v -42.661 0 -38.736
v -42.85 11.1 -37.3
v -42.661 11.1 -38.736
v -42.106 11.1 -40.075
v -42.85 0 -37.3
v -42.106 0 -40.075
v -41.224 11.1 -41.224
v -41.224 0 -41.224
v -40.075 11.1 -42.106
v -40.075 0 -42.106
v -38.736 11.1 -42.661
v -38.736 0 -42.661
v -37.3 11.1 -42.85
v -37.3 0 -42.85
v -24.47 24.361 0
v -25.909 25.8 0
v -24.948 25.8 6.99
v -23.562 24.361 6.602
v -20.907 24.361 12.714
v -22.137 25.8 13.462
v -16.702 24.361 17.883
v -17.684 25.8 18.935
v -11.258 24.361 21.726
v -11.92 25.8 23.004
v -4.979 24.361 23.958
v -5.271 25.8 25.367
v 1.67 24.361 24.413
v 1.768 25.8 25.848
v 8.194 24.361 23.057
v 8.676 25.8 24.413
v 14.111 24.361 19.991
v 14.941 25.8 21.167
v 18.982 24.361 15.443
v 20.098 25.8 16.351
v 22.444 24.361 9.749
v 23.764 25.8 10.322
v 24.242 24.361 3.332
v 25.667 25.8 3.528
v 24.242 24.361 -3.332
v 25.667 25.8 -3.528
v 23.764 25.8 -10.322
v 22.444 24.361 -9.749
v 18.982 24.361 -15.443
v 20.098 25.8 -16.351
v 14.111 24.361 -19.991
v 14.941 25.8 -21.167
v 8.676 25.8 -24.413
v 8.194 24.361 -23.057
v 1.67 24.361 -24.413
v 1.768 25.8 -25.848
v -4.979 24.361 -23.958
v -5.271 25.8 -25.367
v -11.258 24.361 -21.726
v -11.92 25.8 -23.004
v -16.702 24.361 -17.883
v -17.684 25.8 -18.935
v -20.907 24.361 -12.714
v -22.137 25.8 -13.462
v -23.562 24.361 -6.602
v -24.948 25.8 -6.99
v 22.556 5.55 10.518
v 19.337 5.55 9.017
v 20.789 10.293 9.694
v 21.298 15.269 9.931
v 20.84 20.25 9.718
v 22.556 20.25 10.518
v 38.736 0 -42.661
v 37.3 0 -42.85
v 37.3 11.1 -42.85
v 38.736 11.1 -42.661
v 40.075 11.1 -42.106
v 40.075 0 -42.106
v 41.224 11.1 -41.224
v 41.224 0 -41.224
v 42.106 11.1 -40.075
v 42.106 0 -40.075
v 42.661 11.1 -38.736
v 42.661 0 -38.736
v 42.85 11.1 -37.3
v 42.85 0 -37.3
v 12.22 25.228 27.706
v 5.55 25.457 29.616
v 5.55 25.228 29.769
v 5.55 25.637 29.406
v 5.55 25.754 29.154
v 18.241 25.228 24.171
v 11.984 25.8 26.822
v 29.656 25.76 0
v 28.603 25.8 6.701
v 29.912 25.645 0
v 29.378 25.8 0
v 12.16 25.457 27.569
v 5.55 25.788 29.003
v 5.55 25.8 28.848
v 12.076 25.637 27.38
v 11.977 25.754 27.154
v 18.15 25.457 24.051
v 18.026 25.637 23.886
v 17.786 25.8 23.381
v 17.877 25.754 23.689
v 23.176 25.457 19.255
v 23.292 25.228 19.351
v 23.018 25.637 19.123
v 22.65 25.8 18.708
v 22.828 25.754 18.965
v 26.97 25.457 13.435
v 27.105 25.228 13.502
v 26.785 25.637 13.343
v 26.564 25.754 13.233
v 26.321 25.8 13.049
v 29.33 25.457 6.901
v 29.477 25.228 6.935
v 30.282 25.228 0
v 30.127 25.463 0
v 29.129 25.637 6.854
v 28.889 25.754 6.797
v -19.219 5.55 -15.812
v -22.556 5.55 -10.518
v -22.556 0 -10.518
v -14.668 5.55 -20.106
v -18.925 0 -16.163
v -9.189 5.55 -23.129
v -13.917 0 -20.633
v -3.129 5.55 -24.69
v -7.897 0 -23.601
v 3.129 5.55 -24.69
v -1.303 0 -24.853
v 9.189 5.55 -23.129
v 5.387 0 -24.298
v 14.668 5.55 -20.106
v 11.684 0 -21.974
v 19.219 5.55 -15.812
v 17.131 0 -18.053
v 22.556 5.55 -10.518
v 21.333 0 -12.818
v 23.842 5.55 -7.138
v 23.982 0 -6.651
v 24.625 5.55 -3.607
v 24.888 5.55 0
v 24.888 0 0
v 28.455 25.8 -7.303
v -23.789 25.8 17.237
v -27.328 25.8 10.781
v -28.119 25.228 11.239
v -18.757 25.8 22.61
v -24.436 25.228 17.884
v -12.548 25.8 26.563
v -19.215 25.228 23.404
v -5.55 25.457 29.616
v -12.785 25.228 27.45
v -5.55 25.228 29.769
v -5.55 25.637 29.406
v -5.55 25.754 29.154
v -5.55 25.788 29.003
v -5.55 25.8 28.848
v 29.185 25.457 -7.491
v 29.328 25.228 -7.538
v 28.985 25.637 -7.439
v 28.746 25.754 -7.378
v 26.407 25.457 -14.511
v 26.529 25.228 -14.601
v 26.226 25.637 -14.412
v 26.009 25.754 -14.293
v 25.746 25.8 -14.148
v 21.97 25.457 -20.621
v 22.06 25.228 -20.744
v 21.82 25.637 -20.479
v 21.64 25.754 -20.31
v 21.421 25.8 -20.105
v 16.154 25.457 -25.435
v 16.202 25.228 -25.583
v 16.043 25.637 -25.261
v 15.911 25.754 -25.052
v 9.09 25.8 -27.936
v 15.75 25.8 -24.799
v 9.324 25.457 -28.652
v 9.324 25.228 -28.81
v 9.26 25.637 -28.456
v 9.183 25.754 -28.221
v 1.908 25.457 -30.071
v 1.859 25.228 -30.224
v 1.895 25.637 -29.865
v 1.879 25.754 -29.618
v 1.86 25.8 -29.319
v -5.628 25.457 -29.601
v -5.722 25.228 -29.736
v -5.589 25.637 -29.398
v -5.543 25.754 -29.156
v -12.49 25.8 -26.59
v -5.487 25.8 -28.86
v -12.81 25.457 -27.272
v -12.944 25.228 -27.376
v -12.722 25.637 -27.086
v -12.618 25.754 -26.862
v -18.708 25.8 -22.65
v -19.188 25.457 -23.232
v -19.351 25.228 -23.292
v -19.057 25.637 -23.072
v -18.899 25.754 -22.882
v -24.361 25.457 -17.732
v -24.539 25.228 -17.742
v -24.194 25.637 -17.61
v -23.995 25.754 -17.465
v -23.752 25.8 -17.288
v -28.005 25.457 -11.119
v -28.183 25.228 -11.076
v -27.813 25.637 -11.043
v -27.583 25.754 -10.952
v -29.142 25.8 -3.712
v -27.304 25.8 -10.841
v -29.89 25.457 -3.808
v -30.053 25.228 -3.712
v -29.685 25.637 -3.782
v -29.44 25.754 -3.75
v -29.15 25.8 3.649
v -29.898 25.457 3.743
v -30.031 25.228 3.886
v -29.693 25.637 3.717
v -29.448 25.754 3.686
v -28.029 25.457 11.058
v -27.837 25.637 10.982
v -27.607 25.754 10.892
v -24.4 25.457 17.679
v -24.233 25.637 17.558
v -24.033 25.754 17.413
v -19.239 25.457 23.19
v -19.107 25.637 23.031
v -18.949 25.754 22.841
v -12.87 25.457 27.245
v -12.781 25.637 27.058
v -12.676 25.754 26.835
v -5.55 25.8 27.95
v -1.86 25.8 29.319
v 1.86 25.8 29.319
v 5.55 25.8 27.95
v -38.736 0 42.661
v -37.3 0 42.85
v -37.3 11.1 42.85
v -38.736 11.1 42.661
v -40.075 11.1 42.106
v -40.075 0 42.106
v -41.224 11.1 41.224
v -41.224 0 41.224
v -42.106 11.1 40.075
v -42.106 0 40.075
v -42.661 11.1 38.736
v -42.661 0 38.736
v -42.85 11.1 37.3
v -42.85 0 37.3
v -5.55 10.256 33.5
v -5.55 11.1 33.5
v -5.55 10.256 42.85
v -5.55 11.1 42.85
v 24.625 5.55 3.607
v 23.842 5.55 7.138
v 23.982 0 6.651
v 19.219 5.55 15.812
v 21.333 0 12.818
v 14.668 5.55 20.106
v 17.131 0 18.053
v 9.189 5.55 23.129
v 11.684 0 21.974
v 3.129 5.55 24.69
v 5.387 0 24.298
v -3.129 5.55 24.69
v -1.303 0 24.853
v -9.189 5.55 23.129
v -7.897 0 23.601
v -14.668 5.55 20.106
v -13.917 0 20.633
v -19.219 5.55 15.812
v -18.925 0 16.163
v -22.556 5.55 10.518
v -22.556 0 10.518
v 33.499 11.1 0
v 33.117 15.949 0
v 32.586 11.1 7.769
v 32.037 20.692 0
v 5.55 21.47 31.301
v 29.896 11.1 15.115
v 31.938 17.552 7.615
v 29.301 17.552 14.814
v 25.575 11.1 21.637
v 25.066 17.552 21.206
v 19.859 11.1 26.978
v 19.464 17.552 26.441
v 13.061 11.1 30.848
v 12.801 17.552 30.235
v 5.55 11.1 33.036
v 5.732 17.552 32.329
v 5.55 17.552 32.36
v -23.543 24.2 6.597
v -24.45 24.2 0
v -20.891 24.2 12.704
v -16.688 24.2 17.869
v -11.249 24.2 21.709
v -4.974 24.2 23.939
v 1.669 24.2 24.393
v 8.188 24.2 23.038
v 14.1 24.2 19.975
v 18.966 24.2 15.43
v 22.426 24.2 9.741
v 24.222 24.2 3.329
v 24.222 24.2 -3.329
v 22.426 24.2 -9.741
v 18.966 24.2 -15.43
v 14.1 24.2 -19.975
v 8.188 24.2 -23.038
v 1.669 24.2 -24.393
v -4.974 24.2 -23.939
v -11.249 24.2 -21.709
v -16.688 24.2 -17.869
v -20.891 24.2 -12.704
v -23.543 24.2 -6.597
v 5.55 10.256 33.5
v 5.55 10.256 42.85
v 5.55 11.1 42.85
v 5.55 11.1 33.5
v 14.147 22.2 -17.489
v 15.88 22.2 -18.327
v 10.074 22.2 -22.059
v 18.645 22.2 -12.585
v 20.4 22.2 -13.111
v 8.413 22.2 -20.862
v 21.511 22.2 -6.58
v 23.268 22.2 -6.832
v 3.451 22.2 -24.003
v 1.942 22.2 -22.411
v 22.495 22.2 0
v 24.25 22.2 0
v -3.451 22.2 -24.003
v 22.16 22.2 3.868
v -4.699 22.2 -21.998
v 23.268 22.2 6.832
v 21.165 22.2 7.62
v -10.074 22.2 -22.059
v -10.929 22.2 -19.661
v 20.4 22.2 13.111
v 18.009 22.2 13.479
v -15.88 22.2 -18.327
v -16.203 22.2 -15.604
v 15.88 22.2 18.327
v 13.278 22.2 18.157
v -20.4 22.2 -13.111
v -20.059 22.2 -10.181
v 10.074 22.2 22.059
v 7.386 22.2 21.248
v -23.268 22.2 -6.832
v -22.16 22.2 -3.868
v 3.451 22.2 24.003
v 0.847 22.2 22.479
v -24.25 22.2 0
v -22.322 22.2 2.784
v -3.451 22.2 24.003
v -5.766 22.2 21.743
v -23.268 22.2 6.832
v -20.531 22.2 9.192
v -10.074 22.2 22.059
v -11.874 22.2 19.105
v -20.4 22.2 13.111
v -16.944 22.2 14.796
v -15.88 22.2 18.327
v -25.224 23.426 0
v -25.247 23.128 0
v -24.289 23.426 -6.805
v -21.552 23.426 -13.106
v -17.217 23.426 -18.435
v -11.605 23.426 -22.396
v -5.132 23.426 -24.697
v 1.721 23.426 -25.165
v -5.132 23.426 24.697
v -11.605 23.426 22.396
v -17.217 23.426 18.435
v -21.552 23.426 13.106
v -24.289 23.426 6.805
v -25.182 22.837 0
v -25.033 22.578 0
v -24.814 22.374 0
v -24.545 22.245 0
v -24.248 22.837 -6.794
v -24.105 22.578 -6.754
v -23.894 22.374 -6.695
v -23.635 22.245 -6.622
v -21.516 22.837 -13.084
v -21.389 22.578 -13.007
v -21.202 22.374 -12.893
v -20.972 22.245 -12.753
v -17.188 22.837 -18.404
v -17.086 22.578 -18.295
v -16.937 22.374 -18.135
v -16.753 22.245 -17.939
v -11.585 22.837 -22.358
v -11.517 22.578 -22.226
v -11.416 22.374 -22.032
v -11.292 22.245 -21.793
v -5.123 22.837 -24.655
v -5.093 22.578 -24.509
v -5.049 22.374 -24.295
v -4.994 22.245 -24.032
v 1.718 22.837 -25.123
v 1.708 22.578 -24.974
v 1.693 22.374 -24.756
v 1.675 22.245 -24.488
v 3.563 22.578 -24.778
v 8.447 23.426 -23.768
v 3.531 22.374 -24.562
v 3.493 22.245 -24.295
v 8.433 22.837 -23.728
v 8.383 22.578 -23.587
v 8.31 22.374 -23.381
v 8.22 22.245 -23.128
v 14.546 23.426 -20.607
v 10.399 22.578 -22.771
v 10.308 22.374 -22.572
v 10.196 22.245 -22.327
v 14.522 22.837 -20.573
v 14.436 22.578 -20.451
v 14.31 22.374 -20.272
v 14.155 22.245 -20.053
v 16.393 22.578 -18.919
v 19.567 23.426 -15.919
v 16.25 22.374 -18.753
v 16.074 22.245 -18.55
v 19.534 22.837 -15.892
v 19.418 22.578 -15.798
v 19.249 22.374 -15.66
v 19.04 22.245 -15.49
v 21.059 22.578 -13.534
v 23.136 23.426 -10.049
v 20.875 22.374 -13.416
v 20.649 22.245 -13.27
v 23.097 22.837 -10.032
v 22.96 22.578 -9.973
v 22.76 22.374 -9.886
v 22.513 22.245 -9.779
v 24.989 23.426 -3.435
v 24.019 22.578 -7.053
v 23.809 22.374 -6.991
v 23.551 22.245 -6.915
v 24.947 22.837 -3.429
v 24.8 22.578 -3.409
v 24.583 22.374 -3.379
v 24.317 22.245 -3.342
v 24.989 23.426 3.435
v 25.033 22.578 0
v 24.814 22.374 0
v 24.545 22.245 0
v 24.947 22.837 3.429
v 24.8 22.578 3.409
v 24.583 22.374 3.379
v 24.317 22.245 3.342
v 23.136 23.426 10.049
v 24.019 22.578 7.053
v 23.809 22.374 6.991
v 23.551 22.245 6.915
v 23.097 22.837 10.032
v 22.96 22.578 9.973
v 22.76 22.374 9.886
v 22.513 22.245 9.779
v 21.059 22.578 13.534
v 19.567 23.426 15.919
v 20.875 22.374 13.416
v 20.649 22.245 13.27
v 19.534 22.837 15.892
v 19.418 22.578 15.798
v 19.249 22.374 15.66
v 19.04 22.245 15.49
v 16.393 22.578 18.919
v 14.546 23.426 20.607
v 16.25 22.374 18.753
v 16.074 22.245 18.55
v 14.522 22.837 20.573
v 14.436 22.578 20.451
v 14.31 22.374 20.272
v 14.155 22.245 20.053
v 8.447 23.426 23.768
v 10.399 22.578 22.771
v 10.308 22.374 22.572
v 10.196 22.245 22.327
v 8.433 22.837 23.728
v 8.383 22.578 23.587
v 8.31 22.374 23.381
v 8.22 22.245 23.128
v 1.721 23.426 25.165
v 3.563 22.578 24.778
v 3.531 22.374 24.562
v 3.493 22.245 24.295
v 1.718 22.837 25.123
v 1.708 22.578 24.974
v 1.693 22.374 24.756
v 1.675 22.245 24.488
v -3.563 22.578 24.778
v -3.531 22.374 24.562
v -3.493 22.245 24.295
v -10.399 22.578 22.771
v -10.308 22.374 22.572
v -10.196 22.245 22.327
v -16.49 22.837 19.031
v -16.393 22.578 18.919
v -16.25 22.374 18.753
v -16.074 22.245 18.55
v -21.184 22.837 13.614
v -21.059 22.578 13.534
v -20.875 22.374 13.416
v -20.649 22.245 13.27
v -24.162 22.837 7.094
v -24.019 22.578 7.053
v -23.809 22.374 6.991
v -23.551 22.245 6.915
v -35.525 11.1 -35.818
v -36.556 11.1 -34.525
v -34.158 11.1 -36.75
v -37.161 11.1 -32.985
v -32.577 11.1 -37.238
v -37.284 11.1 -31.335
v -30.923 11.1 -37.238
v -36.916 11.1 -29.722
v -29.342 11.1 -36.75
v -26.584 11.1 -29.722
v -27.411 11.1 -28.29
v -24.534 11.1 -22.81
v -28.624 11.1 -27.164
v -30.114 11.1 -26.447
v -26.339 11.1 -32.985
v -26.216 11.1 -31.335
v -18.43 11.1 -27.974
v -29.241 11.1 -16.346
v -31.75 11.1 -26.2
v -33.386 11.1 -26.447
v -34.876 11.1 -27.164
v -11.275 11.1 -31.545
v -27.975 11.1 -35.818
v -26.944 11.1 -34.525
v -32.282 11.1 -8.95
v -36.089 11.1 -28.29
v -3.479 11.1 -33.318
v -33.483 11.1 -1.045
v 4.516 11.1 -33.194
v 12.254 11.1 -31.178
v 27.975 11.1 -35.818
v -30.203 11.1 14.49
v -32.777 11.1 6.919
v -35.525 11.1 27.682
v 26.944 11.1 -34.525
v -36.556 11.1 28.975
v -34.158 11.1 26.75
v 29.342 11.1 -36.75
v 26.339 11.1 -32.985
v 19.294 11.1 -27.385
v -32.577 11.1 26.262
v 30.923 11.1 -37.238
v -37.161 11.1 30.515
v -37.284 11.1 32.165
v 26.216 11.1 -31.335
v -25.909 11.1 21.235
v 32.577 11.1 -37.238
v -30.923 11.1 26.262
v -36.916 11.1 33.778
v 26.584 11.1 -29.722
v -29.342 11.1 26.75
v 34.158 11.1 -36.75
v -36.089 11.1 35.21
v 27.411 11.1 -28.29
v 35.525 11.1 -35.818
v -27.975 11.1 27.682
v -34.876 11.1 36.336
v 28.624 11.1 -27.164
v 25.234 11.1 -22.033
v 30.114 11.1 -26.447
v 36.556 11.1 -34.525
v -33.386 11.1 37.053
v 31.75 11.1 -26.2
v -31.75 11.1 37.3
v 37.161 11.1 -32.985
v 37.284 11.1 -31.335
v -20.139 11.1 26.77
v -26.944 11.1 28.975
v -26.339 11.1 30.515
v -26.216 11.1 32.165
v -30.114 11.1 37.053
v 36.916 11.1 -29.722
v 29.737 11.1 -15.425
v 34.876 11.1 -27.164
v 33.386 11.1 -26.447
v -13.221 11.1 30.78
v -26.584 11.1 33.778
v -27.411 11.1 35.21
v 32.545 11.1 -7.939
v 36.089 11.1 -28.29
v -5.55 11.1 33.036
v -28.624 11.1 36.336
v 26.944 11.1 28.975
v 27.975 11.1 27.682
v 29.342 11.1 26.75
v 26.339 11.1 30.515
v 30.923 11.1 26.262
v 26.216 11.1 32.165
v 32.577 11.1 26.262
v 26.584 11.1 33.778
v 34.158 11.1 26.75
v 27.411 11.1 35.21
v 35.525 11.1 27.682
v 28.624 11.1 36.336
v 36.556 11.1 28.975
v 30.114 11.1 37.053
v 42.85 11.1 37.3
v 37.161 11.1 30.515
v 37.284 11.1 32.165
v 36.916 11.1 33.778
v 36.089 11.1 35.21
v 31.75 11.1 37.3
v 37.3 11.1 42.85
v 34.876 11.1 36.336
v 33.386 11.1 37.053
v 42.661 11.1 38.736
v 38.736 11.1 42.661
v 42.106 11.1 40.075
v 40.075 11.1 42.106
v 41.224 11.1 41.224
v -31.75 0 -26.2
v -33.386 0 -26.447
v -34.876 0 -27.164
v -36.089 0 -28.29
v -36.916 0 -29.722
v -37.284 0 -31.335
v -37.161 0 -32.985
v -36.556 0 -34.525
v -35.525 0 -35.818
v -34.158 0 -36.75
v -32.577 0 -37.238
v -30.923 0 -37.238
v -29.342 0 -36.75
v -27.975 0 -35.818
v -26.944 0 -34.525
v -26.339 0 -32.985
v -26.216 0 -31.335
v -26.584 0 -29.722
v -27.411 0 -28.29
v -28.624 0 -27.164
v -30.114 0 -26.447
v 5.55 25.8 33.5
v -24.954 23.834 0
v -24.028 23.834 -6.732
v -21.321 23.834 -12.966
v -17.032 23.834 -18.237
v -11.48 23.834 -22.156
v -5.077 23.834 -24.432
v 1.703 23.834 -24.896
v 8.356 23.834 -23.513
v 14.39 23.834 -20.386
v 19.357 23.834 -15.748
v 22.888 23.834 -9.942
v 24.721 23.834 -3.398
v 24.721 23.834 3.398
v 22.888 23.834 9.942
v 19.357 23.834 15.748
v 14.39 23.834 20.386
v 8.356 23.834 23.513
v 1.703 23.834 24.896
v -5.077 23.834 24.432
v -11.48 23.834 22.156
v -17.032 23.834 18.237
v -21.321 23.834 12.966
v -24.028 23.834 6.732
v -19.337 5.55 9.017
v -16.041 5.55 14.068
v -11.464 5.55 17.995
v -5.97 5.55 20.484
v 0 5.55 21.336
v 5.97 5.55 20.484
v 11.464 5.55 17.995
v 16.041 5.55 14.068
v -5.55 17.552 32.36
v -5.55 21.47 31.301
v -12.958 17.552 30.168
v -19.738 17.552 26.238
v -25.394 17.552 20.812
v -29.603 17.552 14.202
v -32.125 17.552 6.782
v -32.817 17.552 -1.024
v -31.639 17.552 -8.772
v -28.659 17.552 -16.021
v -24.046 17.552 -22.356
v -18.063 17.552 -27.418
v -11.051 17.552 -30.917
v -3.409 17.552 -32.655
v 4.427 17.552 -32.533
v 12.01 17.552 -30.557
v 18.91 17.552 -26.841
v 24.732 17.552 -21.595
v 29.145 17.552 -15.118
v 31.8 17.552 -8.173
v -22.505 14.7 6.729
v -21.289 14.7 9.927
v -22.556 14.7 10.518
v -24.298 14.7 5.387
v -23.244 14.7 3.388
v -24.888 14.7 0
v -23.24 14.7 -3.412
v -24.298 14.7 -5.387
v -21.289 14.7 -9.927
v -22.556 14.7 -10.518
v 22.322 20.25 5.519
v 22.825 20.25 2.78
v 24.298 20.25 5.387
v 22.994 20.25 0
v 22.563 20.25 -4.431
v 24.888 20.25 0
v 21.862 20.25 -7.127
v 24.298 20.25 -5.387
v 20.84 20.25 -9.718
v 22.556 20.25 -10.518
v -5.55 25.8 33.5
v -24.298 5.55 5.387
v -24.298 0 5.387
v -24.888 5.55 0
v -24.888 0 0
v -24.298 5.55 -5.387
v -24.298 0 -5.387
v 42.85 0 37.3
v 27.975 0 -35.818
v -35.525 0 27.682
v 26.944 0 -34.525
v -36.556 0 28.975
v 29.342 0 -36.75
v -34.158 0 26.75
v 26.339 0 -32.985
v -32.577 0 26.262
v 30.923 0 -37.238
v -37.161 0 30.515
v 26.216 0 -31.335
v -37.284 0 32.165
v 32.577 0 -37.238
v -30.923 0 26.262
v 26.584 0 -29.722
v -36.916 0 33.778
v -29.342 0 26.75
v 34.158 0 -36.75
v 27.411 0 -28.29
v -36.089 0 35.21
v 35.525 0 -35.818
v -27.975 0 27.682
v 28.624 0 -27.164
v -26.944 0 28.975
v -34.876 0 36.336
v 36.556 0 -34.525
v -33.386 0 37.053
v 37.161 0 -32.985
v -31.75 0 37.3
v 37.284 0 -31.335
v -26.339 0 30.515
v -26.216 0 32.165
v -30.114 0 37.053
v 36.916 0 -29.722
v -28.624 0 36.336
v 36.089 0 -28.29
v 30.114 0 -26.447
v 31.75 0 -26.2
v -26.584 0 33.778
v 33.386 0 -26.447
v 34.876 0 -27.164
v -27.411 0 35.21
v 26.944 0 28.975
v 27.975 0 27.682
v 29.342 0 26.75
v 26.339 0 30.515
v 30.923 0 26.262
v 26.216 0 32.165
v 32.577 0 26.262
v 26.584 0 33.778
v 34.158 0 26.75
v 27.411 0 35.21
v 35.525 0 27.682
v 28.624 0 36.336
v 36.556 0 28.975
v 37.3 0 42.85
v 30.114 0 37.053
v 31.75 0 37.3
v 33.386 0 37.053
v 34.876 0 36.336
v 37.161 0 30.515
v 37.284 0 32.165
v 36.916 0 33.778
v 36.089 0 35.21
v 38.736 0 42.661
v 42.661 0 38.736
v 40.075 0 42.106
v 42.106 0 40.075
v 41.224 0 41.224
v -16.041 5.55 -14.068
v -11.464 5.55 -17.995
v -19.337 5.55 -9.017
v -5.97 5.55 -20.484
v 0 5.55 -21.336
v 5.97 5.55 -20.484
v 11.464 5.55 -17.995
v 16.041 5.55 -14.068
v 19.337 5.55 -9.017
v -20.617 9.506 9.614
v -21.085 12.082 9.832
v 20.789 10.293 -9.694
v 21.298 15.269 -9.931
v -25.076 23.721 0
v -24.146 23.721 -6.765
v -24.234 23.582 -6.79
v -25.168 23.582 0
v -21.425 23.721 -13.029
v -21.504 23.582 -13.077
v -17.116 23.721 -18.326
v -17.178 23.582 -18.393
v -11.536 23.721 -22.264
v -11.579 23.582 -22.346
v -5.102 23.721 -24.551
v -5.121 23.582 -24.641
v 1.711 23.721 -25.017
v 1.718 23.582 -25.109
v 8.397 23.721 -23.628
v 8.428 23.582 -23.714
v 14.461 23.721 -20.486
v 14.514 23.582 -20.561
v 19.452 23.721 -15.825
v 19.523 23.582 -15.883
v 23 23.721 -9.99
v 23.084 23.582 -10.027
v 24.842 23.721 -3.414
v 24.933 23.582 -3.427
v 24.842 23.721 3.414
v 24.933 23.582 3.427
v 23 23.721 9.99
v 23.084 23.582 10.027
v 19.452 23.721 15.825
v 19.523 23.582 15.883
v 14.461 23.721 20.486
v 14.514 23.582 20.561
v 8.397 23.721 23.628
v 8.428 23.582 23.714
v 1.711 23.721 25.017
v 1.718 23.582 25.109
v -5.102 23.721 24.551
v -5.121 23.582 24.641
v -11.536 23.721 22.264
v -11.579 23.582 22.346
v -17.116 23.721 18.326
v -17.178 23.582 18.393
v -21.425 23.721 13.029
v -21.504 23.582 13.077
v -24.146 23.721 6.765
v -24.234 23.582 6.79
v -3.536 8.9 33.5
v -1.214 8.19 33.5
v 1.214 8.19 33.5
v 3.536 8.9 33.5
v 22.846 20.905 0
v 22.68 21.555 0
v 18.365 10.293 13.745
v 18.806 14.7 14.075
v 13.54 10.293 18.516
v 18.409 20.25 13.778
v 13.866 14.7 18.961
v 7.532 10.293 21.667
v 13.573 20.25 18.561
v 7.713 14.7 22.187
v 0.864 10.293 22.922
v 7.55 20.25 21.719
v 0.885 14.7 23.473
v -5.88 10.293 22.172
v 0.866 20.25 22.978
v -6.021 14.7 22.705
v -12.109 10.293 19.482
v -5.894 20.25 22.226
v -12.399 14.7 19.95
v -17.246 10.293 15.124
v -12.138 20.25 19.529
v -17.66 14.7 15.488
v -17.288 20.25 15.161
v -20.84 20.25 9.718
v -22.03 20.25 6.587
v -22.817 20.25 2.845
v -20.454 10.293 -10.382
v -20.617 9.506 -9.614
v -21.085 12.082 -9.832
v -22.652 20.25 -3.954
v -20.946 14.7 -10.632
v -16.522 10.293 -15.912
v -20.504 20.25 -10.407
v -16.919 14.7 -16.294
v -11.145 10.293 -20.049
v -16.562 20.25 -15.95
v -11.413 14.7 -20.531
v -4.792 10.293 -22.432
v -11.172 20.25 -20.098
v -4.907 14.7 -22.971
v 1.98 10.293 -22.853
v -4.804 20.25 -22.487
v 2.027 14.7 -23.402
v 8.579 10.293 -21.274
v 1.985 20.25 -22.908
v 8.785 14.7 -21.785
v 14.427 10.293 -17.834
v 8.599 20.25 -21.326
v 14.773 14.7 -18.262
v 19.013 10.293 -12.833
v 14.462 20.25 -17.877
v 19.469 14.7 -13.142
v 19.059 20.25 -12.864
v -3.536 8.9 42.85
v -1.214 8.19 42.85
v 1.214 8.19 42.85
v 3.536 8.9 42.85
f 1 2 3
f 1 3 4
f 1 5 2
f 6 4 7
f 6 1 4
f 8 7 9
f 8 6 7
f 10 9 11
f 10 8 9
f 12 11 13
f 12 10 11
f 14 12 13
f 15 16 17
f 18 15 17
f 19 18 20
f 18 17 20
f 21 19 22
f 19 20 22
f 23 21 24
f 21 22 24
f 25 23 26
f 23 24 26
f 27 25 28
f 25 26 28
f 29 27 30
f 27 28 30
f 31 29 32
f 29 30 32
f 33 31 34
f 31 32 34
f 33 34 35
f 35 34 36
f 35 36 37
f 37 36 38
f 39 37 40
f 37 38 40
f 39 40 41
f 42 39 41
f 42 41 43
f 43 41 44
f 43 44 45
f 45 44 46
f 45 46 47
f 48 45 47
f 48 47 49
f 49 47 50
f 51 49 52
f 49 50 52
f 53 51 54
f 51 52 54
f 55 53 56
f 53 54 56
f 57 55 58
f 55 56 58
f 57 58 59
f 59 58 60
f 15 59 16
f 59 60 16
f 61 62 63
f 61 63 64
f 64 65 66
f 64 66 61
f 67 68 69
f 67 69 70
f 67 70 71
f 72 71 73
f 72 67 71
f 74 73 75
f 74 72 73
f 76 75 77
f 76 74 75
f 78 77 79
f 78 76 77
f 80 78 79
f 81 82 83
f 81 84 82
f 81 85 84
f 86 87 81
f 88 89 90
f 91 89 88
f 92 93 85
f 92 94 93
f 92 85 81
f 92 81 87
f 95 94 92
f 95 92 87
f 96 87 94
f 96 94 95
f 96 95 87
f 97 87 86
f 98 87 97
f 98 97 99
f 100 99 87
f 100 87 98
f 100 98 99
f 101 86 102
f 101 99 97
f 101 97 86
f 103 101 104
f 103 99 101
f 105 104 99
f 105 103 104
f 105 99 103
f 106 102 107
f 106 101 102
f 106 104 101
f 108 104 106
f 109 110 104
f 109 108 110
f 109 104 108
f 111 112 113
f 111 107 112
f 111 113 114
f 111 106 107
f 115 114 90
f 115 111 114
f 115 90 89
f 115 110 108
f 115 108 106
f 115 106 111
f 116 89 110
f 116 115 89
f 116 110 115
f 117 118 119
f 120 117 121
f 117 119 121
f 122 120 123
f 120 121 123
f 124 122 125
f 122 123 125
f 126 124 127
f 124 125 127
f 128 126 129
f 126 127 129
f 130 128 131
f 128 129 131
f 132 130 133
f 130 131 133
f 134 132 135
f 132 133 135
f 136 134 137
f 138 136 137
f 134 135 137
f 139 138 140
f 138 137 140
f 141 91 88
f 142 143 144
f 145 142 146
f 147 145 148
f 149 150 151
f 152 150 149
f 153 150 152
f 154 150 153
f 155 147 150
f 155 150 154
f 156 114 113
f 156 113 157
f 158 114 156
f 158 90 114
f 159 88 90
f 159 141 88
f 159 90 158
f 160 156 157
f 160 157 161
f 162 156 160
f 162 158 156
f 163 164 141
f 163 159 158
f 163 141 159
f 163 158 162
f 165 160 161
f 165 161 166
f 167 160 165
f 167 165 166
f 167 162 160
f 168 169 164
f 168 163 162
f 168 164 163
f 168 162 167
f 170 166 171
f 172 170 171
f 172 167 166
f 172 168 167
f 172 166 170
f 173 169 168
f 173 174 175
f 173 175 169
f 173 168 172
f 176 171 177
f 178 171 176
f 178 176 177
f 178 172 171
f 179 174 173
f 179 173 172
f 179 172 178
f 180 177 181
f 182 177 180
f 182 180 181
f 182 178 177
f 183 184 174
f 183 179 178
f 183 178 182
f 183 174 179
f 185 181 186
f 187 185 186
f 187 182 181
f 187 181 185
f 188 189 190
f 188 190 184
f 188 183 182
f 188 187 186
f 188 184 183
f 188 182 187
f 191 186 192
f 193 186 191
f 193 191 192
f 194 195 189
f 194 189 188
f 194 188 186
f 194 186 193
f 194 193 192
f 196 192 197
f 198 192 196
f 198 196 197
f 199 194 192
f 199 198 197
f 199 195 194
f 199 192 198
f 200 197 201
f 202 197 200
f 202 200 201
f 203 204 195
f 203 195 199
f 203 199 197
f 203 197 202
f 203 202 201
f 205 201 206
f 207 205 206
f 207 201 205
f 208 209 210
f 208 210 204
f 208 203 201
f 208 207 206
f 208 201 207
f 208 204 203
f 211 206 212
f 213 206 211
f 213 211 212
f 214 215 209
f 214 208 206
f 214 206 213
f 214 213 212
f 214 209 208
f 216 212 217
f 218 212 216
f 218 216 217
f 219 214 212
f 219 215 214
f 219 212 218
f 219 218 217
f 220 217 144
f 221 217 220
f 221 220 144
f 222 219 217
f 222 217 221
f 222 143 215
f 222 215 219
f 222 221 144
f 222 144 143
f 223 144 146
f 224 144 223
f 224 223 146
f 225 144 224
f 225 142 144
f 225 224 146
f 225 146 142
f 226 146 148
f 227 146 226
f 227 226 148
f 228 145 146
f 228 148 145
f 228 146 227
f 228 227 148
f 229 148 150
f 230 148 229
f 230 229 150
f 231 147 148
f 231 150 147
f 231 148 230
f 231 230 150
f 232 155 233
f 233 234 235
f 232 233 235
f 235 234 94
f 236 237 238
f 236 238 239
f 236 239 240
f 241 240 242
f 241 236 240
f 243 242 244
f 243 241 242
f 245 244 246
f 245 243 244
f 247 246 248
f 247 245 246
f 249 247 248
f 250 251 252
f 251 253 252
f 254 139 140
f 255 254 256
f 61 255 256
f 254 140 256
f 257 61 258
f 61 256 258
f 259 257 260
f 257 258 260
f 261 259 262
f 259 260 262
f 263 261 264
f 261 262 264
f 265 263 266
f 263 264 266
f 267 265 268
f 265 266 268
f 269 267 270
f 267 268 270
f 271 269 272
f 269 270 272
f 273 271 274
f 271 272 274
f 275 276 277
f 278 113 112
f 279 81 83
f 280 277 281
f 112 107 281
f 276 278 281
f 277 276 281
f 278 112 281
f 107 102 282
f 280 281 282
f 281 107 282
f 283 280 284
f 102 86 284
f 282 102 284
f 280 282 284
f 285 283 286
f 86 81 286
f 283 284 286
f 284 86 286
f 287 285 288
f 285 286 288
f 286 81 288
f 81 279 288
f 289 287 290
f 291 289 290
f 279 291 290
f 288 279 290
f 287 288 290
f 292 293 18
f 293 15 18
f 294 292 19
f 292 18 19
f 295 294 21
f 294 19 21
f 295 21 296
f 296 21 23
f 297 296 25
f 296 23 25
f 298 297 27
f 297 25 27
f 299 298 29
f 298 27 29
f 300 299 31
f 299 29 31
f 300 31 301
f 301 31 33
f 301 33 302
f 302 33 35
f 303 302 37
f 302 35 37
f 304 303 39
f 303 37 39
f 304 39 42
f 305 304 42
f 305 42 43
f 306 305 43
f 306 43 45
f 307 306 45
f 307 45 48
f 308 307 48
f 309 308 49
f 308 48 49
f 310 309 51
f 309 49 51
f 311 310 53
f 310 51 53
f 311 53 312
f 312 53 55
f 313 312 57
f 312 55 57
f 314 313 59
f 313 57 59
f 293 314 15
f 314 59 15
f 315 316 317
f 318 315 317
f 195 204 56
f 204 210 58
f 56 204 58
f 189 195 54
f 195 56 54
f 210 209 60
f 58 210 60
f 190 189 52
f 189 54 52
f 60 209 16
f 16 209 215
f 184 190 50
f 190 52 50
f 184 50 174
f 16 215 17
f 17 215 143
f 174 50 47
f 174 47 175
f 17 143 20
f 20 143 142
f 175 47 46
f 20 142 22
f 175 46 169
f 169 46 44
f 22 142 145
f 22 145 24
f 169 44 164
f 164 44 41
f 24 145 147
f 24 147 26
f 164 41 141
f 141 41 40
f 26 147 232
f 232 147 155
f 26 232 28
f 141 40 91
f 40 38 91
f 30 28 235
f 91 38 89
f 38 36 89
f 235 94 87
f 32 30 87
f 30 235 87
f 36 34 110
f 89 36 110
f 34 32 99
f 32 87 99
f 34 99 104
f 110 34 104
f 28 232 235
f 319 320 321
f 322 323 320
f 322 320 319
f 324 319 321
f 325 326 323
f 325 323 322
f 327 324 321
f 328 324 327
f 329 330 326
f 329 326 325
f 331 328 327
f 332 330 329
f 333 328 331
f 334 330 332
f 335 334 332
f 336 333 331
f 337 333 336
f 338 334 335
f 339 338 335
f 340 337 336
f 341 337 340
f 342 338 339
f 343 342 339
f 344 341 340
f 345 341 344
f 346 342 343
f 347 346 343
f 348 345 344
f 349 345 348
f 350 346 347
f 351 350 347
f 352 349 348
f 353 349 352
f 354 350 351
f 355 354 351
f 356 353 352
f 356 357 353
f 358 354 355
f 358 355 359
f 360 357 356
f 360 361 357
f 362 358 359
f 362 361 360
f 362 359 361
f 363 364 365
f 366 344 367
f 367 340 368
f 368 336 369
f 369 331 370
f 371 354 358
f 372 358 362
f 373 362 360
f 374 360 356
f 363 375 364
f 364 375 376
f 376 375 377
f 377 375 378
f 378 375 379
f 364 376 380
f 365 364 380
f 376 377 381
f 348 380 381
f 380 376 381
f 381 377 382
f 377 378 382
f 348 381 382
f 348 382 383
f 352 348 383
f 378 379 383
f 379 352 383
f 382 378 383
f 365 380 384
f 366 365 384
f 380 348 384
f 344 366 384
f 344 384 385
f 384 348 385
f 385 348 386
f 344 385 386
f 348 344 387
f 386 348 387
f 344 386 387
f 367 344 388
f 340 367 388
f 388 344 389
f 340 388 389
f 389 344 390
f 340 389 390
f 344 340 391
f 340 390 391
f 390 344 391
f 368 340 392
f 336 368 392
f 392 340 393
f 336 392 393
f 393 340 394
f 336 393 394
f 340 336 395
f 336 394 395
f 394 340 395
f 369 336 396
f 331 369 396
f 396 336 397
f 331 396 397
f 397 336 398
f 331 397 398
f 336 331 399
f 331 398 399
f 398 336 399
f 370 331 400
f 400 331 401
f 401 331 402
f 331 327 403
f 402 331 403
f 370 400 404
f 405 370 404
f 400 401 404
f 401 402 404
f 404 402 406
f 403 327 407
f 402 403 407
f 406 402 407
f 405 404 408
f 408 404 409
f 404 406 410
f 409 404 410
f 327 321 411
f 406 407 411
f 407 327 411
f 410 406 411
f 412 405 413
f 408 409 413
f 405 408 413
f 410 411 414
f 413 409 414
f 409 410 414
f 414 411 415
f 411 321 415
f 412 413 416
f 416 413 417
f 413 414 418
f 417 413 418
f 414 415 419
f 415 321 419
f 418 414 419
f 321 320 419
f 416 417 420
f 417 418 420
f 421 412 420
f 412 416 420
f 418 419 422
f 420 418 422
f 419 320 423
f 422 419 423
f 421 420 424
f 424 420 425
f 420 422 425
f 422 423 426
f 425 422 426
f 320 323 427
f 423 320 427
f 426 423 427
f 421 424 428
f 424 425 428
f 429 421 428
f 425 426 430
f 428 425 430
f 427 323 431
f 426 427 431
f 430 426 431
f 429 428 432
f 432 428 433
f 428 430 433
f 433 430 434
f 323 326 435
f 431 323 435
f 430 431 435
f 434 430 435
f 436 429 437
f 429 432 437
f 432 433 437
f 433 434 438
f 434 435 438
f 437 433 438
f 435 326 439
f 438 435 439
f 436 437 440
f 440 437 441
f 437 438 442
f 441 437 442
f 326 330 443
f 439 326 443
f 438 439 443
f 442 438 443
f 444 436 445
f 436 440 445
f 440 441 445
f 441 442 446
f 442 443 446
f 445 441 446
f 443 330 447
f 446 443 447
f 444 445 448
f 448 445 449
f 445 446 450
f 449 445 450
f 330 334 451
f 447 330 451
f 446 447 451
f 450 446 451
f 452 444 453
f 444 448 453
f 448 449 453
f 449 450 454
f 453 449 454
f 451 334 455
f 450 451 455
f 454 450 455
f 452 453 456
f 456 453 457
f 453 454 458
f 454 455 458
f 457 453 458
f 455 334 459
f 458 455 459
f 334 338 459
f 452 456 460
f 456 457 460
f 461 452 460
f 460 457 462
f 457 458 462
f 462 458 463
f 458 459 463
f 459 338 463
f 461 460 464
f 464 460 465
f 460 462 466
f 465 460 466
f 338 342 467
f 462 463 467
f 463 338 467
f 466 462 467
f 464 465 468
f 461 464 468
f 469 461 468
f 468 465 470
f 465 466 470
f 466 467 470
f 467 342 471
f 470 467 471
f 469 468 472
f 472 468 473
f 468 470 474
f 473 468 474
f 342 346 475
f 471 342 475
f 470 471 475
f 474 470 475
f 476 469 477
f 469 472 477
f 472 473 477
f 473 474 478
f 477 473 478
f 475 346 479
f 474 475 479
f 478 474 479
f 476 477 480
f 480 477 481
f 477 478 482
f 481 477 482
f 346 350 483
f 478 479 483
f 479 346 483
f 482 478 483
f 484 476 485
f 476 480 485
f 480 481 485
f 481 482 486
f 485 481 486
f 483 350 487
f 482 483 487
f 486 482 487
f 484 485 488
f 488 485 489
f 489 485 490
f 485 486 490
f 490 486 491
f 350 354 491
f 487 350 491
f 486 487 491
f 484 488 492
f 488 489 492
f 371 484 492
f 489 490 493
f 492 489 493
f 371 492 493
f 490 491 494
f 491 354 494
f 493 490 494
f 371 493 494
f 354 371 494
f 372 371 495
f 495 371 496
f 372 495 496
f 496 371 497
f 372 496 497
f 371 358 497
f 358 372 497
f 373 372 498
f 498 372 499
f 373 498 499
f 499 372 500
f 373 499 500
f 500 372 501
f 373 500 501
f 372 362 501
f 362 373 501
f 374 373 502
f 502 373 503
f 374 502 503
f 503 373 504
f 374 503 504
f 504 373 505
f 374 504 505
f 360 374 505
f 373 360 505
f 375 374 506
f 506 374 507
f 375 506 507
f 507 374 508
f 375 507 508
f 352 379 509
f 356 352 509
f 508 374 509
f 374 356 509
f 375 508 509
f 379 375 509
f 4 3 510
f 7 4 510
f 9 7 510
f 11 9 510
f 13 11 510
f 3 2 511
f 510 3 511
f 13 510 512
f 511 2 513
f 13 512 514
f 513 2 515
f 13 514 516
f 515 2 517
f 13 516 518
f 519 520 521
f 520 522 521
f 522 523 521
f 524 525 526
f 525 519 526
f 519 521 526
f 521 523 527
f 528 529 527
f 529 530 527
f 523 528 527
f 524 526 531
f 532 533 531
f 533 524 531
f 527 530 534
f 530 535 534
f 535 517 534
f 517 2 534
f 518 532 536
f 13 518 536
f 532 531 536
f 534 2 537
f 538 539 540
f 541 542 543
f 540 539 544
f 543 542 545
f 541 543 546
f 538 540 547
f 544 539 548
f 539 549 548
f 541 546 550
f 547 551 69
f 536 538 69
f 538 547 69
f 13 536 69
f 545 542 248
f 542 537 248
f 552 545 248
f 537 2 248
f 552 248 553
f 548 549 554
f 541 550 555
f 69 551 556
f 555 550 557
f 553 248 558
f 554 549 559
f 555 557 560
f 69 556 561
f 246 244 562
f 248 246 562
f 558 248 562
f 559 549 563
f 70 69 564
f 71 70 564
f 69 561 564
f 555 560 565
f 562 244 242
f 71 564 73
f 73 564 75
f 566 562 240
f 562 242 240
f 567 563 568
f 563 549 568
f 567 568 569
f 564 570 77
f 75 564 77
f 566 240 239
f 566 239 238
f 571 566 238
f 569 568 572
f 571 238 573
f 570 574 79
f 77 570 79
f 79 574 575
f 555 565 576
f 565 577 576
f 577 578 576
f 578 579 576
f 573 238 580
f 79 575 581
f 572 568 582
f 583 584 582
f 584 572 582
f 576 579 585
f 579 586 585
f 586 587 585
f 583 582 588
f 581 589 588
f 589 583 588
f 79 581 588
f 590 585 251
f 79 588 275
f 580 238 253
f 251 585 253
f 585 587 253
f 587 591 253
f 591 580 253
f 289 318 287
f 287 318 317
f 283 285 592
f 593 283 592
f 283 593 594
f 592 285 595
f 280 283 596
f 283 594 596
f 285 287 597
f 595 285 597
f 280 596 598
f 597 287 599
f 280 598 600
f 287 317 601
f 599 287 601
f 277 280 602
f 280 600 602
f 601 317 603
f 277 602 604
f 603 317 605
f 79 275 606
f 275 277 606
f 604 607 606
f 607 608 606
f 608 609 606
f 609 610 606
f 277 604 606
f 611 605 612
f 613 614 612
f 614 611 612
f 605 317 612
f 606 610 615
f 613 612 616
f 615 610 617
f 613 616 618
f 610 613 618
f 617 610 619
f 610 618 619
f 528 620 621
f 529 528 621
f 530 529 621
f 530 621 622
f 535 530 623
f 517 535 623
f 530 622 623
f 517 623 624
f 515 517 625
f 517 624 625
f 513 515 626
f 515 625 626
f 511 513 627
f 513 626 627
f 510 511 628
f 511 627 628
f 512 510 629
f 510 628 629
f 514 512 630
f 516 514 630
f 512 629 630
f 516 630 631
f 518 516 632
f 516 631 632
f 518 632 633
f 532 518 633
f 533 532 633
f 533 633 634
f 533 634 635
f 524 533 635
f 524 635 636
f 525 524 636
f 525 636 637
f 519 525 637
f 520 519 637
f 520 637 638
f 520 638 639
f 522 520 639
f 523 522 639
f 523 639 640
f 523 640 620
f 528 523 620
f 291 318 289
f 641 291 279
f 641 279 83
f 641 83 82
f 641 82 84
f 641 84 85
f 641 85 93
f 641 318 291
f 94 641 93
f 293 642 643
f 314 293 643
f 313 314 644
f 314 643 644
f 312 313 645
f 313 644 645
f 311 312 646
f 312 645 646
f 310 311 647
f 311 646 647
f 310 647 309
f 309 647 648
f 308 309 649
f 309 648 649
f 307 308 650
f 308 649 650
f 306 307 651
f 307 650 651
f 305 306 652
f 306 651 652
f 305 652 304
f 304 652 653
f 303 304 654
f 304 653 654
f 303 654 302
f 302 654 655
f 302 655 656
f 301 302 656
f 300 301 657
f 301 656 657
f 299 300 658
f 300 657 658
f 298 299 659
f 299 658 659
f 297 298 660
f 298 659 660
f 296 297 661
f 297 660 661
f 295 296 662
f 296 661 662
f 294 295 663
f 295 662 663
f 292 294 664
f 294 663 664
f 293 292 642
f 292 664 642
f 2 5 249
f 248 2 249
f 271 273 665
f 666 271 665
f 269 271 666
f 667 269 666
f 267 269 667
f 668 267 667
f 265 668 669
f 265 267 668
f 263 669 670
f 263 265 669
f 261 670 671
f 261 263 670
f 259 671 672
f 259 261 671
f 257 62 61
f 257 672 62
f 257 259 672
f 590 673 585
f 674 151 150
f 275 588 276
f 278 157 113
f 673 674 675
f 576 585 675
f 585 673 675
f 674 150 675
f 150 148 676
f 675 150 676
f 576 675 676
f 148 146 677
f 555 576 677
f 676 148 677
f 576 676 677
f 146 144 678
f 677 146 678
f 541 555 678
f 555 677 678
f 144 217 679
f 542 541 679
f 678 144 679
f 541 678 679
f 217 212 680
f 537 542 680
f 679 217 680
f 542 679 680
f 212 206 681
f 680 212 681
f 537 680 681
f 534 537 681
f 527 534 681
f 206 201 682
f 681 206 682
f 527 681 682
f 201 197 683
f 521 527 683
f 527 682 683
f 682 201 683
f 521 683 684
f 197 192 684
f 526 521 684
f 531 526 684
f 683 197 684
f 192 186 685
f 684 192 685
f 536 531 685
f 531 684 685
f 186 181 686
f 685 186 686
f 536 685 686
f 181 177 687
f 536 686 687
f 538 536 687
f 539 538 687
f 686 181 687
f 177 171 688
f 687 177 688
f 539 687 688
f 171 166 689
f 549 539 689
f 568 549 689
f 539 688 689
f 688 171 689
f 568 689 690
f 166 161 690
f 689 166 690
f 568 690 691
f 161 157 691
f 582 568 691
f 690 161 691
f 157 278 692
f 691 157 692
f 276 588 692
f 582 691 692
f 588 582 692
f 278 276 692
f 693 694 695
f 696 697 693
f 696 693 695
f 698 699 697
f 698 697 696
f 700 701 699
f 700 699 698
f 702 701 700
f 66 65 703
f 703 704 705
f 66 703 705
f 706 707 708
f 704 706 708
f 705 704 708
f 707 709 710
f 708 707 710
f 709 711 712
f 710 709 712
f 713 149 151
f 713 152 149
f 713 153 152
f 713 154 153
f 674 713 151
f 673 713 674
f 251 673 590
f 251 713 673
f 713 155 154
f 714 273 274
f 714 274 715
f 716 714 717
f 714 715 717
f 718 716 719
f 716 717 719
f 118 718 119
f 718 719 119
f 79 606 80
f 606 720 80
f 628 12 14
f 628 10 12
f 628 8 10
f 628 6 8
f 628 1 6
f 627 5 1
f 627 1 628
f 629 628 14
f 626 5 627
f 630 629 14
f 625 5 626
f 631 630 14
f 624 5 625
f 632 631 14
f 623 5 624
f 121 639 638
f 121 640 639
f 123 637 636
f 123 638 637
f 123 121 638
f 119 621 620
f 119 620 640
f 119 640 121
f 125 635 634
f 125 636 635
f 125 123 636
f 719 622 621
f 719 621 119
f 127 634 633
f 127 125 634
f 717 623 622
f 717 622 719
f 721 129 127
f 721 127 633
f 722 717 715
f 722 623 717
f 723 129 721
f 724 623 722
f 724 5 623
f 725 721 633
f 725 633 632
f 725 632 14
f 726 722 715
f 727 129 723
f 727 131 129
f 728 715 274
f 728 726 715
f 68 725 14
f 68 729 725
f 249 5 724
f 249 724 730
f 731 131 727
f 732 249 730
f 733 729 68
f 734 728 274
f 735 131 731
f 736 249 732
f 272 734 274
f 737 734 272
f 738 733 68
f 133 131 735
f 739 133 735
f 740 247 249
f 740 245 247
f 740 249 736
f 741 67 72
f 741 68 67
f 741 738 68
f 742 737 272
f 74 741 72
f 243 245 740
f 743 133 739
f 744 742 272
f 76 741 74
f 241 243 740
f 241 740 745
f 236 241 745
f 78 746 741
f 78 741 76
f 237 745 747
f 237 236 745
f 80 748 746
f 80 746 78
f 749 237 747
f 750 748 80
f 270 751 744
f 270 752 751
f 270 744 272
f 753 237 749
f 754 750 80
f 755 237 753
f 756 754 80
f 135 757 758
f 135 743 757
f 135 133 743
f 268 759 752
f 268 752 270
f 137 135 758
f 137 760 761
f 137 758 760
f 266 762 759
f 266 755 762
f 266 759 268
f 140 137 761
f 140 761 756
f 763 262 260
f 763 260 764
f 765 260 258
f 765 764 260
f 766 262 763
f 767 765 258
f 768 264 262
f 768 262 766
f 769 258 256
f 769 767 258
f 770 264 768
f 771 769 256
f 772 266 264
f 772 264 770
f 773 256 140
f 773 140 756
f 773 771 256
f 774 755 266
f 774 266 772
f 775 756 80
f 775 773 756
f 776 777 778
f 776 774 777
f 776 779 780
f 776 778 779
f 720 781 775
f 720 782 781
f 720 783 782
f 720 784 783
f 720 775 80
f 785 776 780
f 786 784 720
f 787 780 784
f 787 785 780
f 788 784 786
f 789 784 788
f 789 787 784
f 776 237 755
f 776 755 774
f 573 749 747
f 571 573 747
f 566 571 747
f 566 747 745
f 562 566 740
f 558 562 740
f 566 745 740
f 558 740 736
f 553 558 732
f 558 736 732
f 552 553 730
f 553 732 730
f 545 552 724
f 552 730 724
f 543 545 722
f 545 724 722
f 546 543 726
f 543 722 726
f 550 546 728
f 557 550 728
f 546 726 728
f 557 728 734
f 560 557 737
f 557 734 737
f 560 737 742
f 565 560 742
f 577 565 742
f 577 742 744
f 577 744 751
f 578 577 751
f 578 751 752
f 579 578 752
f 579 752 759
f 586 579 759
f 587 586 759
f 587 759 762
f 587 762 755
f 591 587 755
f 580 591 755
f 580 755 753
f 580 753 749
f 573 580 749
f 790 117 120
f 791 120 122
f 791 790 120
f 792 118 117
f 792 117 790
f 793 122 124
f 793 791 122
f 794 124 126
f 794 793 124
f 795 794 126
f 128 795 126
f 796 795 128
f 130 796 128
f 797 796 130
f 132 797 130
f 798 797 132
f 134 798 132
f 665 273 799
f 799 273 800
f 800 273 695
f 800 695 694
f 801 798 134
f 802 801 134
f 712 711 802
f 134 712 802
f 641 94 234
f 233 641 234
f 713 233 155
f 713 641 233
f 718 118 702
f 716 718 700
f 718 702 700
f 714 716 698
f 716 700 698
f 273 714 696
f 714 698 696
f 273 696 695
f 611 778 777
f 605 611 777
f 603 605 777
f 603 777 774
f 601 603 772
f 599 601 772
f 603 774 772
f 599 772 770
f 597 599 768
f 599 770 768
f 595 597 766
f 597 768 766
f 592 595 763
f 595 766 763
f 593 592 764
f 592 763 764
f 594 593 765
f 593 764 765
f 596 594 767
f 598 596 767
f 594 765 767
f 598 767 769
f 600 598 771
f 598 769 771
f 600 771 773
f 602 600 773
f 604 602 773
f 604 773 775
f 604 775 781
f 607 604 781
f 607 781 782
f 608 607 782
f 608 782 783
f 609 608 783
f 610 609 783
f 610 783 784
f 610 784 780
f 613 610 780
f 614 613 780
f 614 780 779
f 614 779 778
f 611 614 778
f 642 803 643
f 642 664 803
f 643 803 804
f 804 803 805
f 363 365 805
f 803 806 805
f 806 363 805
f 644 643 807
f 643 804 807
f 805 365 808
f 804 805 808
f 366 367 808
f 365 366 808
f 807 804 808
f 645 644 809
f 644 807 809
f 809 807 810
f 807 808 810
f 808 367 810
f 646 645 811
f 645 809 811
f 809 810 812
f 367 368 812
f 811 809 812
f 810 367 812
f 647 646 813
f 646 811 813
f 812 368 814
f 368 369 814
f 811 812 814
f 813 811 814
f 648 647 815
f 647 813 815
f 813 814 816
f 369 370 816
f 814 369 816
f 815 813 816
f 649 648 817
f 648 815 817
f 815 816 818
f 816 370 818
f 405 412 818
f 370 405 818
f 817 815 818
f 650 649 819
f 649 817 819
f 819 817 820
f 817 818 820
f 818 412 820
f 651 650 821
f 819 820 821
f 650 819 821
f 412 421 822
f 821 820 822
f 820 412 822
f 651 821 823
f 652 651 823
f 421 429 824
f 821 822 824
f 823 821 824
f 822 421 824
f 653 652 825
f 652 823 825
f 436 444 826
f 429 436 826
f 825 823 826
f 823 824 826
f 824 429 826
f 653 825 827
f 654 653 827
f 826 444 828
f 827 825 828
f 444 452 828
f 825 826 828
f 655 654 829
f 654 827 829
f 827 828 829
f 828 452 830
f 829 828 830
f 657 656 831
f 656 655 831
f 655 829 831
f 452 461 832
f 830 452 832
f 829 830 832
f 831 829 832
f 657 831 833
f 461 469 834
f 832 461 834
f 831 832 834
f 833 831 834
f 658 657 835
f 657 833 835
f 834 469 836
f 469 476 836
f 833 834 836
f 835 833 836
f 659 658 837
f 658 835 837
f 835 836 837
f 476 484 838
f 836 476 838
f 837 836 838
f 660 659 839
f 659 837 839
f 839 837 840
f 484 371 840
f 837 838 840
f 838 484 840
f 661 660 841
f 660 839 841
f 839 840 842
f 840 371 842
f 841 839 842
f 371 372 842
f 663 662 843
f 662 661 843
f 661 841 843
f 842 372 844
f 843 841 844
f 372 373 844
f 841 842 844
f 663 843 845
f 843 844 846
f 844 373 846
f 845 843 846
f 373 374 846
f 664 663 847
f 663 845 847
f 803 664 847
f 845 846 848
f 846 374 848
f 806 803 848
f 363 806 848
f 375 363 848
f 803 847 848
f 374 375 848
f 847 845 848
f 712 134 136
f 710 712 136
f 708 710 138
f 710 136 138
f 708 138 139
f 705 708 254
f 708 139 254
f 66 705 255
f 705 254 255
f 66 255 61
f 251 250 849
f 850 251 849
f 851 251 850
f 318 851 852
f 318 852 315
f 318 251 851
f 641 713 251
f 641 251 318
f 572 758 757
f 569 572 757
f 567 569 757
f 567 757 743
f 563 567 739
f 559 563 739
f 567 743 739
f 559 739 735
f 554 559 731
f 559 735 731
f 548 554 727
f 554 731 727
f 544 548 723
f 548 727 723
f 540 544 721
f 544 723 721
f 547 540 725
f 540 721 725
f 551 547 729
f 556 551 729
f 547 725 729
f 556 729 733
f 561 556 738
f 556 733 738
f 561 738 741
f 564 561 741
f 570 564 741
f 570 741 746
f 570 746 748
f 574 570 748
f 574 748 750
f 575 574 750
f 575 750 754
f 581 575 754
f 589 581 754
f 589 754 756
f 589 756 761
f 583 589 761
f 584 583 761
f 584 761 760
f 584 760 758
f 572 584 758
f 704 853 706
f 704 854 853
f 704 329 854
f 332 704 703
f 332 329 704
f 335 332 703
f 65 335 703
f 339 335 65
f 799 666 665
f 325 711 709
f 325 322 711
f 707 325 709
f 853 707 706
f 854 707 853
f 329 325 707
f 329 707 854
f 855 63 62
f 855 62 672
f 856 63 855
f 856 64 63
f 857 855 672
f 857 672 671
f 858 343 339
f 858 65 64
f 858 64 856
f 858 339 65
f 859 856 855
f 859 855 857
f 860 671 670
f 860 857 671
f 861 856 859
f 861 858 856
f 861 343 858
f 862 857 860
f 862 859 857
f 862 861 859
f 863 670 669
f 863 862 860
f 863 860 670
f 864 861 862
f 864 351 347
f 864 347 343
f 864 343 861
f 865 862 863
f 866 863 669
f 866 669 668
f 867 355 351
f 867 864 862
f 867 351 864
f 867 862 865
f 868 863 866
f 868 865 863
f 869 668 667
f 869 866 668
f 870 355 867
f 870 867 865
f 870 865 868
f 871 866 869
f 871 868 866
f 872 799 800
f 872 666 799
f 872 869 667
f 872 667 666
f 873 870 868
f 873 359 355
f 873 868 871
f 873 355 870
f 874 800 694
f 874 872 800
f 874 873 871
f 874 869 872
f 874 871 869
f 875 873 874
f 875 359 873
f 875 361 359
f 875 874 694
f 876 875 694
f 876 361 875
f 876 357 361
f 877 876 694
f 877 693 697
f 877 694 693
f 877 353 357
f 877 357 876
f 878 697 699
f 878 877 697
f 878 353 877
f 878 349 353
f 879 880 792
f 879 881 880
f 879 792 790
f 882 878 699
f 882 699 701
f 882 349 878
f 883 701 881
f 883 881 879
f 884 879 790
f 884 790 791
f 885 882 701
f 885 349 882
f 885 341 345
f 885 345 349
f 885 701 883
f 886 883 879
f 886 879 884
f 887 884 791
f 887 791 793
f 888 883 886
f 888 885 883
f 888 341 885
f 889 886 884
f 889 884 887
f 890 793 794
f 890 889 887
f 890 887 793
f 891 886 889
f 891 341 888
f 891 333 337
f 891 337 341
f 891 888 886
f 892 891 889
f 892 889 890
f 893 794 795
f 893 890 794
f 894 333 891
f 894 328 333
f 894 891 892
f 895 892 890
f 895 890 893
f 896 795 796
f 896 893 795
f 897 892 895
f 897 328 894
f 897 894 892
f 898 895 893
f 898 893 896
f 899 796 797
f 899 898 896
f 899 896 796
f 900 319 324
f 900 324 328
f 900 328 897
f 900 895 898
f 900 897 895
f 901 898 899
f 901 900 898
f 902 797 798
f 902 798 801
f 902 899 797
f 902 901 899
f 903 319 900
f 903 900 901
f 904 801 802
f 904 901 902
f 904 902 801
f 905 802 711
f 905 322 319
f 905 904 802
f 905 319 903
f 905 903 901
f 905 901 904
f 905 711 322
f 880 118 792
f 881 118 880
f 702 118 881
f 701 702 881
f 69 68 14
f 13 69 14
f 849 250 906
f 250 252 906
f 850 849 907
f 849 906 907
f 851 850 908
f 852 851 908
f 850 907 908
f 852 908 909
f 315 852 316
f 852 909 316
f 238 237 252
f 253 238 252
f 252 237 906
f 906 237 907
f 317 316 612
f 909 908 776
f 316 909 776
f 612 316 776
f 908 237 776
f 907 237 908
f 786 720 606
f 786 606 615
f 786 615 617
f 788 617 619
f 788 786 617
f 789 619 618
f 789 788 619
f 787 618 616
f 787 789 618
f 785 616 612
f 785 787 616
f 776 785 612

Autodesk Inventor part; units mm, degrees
sketch "Sketch_1" plane through (0, 0, 0) normal (0, 0, 1) x (1, 0, 0)
  line L0 (0, 0) -> (0, 25.8)
  arc A0 (21.3361, 5.55) -> (21.0734, 25.8) centre (0, 15.4) ccw
  line L1 (21.3361, 5.55) -> (24.8875, 5.55)
  line L2 (24.8875, 5.55) -> (24.8875, 0)
  line L3 (24.8875, 0) -> (85.7, 0)
  line L4 (85.7, 0) -> (85.7, 9.1)
  arc A1 (85.7, 9.1) -> (83.7, 11.1) centre (83.7, 9.1) ccw
  line L5 (83.7, 11.1) -> (33.4994, 11.1)
  arc A2 (33.4994, 11.1) -> (30.2815, 25.2277) centre (0, 10.9) ccw
  arc A3 (30.2815, 25.2277) -> (29.3775, 25.8) centre (29.3775, 24.8) ccw
  line L6 (29.3775, 25.8) -> (21.0734, 25.8)
revolve "Revolution1" add sketch "Sketch_1" angle 360 about axis through (0, 0, 0) along (0, -1, 0)
sketch "Sketch_6" plane through (0, 0, 0) normal (0, 1, 0) x (-1, 0, 0)
  circle A0 centre (0, 0) radius 87.7
  arc A1 (42.85, 37.3) -> (37.3, 42.85) centre (37.3, 37.3) ccw
  line L0 (37.3, 42.85) -> (-37.3, 42.85)
  arc A2 (-37.3, 42.85) -> (-42.85, 37.3) centre (-37.3, 37.3) ccw
  line L1 (-42.85, 37.3) -> (-42.85, -37.3)
  arc A3 (-42.85, -37.3) -> (-37.3, -42.85) centre (-37.3, -37.3) ccw
  line L2 (-37.3, -42.85) -> (37.3, -42.85)
  arc A4 (37.3, -42.85) -> (42.85, -37.3) centre (37.3, -37.3) ccw
  line L3 (42.85, -37.3) -> (42.85, 37.3)
extrude "Extrusion1" cut sketch "Sketch_6" along normal blind 25.8
sketch "Sketch_7" plane through (0, 0, 42.85) normal (0, 0, 1) x (1, 0, 0)
  arc A0 (-5.55, 10.2565) -> (5.55, 10.2565) centre (0, 16.32) ccw
  line L0 (5.55, 10.2565) -> (5.55, 11.1)
  line L1 (5.55, 11.1) -> (-5.55, 11.1)
  line L2 (-5.55, 11.1) -> (-5.55, 10.2565)
extrude "Extrusion2" cut sketch "Sketch_7" against normal blind 12.85
sketch "Sketch_4" plane through (0, 0, 0) normal (0, 0, 1) x (1, 0, 0)
  line L0 (0, 5.55) -> (0, 20.25)
  line L1 (0, 20.25) -> (24.8875, 20.25)
  line L2 (24.8875, 20.25) -> (24.8875, 5.55)
  line L3 (24.8875, 5.55) -> (0, 5.55)
  line L4 (0, 5.55) -> (0, 20.25)
revolve "Revolution2" cut sketch "Sketch_4" angle 50 mid plane about axis through (0, 5.55, 0) along (0, 1, 0)
sketch "Sketch_5" plane through (0, 0, 0) normal (0, 0, 1) x (1, 0, 0)
  line L0 (0, 14.7) -> (0, -5.55)
  line L1 (0, -5.55) -> (-24.8875, -5.55)
  line L2 (-24.8875, -5.55) -> (-24.8875, 14.7)
  line L3 (-24.8875, 14.7) -> (0, 14.7)
  line L4 (0, 14.7) -> (0, -5.55)
revolve "Revolution3" cut sketch "Sketch_5" angle 50 mid plane about axis through (0, 14.7, 0) along (0, -1, 0)
sketch "Sketch6" plane through (-37.3, 11.1, -42.85) normal (0, 1, 0) x (1, 0, 0)
  point P0 (5.55, -11.1)
hole "Hole1" at (-31.75, 11.1, -31.75) direction (0, -1, 0) diameter 11.1 depth 11.1
pattern_linear "Rectangular Pattern1" count 2 spacing 63.5 along (1, 0, 0) count 2 spacing 63.5 along (0, 0, 1) of "Hole1"
sketch "Sketch_9" plane through (0, 0, 0) normal (0, 0, 1) x (1, 0, 0)
  line L0 (0, 25.8) -> (0, 22.2)
  line L1 (0, 22.2) -> (-24.25, 22.2)
  arc A0 (-25.2242, 23.4257) -> (-24.25, 22.2) centre (-24.25, 23.2) ccw
  arc A1 (-24.9537, 23.834) -> (-25.2242, 23.4257) centre (-24.5423, 23.2677) ccw
  line L2 (-24.9537, 23.834) -> (-24.45, 24.2)
  line L3 (-24.45, 24.2) -> (-24.4698, 24.361)
  line L4 (-24.4698, 24.361) -> (-25.9088, 25.8)
  line L5 (-25.9088, 25.8) -> (0, 25.8)
  line L6 (0, 25.8) -> (0, 22.2)
revolve "Revolution4" cut sketch "Sketch_9" angle 360 about axis through (0, 25.8, 0) along (0, 1, 0)
sketch "Sketch_10" plane through (0, 0, 33.5) normal (0, 0, 1) x (1, 0, 0)
  line L0 (-5.55, 25.8) -> (-5.55, 6.1)
  line L1 (-5.55, 6.1) -> (5.55, 6.1)
  line L2 (5.55, 6.1) -> (5.55, 25.8)
  line L3 (5.55, 25.8) -> (-5.55, 25.8)
extrude "Extrusion3" add sketch "Sketch_10" against normal blind 5.55
ref_plane "brg_XY" through (0, 12.9, 0) normal (0, 1, 0) x (1, 0, 0)
ref_plane "brg_YZ" through (0, 12.9, 0) normal (1, 0, 0) x (0, 0, -1)
ref_plane "brg_ZX" through (0, 12.9, 0) normal (0, 0, -1) x (0, 1, 0)
ref_plane "housing_XY" through (0, 0, 0) normal (0, 1, 0) x (1, 0, 0)
ref_plane "housing_YZ" through (0, 0, 0) normal (1, 0, 0) x (0, 0, -1)
ref_plane "housing_ZX" through (0, 0, 0) normal (0, 0, -1) x (0, 1, 0)
ref_plane "tocover_XY" through (0, 51.2, 0) normal (0, 1, 0) x (1, 0, 0)
ref_plane "tocover_YZ" through (0, 51.2, 0) normal (1, 0, 0) x (0, 0, -1)
ref_plane "tocover_ZX" through (0, 51.2, 0) normal (0, 0, -1) x (0, 1, 0)
properties part number "F4BSS 504-Y-housing"
